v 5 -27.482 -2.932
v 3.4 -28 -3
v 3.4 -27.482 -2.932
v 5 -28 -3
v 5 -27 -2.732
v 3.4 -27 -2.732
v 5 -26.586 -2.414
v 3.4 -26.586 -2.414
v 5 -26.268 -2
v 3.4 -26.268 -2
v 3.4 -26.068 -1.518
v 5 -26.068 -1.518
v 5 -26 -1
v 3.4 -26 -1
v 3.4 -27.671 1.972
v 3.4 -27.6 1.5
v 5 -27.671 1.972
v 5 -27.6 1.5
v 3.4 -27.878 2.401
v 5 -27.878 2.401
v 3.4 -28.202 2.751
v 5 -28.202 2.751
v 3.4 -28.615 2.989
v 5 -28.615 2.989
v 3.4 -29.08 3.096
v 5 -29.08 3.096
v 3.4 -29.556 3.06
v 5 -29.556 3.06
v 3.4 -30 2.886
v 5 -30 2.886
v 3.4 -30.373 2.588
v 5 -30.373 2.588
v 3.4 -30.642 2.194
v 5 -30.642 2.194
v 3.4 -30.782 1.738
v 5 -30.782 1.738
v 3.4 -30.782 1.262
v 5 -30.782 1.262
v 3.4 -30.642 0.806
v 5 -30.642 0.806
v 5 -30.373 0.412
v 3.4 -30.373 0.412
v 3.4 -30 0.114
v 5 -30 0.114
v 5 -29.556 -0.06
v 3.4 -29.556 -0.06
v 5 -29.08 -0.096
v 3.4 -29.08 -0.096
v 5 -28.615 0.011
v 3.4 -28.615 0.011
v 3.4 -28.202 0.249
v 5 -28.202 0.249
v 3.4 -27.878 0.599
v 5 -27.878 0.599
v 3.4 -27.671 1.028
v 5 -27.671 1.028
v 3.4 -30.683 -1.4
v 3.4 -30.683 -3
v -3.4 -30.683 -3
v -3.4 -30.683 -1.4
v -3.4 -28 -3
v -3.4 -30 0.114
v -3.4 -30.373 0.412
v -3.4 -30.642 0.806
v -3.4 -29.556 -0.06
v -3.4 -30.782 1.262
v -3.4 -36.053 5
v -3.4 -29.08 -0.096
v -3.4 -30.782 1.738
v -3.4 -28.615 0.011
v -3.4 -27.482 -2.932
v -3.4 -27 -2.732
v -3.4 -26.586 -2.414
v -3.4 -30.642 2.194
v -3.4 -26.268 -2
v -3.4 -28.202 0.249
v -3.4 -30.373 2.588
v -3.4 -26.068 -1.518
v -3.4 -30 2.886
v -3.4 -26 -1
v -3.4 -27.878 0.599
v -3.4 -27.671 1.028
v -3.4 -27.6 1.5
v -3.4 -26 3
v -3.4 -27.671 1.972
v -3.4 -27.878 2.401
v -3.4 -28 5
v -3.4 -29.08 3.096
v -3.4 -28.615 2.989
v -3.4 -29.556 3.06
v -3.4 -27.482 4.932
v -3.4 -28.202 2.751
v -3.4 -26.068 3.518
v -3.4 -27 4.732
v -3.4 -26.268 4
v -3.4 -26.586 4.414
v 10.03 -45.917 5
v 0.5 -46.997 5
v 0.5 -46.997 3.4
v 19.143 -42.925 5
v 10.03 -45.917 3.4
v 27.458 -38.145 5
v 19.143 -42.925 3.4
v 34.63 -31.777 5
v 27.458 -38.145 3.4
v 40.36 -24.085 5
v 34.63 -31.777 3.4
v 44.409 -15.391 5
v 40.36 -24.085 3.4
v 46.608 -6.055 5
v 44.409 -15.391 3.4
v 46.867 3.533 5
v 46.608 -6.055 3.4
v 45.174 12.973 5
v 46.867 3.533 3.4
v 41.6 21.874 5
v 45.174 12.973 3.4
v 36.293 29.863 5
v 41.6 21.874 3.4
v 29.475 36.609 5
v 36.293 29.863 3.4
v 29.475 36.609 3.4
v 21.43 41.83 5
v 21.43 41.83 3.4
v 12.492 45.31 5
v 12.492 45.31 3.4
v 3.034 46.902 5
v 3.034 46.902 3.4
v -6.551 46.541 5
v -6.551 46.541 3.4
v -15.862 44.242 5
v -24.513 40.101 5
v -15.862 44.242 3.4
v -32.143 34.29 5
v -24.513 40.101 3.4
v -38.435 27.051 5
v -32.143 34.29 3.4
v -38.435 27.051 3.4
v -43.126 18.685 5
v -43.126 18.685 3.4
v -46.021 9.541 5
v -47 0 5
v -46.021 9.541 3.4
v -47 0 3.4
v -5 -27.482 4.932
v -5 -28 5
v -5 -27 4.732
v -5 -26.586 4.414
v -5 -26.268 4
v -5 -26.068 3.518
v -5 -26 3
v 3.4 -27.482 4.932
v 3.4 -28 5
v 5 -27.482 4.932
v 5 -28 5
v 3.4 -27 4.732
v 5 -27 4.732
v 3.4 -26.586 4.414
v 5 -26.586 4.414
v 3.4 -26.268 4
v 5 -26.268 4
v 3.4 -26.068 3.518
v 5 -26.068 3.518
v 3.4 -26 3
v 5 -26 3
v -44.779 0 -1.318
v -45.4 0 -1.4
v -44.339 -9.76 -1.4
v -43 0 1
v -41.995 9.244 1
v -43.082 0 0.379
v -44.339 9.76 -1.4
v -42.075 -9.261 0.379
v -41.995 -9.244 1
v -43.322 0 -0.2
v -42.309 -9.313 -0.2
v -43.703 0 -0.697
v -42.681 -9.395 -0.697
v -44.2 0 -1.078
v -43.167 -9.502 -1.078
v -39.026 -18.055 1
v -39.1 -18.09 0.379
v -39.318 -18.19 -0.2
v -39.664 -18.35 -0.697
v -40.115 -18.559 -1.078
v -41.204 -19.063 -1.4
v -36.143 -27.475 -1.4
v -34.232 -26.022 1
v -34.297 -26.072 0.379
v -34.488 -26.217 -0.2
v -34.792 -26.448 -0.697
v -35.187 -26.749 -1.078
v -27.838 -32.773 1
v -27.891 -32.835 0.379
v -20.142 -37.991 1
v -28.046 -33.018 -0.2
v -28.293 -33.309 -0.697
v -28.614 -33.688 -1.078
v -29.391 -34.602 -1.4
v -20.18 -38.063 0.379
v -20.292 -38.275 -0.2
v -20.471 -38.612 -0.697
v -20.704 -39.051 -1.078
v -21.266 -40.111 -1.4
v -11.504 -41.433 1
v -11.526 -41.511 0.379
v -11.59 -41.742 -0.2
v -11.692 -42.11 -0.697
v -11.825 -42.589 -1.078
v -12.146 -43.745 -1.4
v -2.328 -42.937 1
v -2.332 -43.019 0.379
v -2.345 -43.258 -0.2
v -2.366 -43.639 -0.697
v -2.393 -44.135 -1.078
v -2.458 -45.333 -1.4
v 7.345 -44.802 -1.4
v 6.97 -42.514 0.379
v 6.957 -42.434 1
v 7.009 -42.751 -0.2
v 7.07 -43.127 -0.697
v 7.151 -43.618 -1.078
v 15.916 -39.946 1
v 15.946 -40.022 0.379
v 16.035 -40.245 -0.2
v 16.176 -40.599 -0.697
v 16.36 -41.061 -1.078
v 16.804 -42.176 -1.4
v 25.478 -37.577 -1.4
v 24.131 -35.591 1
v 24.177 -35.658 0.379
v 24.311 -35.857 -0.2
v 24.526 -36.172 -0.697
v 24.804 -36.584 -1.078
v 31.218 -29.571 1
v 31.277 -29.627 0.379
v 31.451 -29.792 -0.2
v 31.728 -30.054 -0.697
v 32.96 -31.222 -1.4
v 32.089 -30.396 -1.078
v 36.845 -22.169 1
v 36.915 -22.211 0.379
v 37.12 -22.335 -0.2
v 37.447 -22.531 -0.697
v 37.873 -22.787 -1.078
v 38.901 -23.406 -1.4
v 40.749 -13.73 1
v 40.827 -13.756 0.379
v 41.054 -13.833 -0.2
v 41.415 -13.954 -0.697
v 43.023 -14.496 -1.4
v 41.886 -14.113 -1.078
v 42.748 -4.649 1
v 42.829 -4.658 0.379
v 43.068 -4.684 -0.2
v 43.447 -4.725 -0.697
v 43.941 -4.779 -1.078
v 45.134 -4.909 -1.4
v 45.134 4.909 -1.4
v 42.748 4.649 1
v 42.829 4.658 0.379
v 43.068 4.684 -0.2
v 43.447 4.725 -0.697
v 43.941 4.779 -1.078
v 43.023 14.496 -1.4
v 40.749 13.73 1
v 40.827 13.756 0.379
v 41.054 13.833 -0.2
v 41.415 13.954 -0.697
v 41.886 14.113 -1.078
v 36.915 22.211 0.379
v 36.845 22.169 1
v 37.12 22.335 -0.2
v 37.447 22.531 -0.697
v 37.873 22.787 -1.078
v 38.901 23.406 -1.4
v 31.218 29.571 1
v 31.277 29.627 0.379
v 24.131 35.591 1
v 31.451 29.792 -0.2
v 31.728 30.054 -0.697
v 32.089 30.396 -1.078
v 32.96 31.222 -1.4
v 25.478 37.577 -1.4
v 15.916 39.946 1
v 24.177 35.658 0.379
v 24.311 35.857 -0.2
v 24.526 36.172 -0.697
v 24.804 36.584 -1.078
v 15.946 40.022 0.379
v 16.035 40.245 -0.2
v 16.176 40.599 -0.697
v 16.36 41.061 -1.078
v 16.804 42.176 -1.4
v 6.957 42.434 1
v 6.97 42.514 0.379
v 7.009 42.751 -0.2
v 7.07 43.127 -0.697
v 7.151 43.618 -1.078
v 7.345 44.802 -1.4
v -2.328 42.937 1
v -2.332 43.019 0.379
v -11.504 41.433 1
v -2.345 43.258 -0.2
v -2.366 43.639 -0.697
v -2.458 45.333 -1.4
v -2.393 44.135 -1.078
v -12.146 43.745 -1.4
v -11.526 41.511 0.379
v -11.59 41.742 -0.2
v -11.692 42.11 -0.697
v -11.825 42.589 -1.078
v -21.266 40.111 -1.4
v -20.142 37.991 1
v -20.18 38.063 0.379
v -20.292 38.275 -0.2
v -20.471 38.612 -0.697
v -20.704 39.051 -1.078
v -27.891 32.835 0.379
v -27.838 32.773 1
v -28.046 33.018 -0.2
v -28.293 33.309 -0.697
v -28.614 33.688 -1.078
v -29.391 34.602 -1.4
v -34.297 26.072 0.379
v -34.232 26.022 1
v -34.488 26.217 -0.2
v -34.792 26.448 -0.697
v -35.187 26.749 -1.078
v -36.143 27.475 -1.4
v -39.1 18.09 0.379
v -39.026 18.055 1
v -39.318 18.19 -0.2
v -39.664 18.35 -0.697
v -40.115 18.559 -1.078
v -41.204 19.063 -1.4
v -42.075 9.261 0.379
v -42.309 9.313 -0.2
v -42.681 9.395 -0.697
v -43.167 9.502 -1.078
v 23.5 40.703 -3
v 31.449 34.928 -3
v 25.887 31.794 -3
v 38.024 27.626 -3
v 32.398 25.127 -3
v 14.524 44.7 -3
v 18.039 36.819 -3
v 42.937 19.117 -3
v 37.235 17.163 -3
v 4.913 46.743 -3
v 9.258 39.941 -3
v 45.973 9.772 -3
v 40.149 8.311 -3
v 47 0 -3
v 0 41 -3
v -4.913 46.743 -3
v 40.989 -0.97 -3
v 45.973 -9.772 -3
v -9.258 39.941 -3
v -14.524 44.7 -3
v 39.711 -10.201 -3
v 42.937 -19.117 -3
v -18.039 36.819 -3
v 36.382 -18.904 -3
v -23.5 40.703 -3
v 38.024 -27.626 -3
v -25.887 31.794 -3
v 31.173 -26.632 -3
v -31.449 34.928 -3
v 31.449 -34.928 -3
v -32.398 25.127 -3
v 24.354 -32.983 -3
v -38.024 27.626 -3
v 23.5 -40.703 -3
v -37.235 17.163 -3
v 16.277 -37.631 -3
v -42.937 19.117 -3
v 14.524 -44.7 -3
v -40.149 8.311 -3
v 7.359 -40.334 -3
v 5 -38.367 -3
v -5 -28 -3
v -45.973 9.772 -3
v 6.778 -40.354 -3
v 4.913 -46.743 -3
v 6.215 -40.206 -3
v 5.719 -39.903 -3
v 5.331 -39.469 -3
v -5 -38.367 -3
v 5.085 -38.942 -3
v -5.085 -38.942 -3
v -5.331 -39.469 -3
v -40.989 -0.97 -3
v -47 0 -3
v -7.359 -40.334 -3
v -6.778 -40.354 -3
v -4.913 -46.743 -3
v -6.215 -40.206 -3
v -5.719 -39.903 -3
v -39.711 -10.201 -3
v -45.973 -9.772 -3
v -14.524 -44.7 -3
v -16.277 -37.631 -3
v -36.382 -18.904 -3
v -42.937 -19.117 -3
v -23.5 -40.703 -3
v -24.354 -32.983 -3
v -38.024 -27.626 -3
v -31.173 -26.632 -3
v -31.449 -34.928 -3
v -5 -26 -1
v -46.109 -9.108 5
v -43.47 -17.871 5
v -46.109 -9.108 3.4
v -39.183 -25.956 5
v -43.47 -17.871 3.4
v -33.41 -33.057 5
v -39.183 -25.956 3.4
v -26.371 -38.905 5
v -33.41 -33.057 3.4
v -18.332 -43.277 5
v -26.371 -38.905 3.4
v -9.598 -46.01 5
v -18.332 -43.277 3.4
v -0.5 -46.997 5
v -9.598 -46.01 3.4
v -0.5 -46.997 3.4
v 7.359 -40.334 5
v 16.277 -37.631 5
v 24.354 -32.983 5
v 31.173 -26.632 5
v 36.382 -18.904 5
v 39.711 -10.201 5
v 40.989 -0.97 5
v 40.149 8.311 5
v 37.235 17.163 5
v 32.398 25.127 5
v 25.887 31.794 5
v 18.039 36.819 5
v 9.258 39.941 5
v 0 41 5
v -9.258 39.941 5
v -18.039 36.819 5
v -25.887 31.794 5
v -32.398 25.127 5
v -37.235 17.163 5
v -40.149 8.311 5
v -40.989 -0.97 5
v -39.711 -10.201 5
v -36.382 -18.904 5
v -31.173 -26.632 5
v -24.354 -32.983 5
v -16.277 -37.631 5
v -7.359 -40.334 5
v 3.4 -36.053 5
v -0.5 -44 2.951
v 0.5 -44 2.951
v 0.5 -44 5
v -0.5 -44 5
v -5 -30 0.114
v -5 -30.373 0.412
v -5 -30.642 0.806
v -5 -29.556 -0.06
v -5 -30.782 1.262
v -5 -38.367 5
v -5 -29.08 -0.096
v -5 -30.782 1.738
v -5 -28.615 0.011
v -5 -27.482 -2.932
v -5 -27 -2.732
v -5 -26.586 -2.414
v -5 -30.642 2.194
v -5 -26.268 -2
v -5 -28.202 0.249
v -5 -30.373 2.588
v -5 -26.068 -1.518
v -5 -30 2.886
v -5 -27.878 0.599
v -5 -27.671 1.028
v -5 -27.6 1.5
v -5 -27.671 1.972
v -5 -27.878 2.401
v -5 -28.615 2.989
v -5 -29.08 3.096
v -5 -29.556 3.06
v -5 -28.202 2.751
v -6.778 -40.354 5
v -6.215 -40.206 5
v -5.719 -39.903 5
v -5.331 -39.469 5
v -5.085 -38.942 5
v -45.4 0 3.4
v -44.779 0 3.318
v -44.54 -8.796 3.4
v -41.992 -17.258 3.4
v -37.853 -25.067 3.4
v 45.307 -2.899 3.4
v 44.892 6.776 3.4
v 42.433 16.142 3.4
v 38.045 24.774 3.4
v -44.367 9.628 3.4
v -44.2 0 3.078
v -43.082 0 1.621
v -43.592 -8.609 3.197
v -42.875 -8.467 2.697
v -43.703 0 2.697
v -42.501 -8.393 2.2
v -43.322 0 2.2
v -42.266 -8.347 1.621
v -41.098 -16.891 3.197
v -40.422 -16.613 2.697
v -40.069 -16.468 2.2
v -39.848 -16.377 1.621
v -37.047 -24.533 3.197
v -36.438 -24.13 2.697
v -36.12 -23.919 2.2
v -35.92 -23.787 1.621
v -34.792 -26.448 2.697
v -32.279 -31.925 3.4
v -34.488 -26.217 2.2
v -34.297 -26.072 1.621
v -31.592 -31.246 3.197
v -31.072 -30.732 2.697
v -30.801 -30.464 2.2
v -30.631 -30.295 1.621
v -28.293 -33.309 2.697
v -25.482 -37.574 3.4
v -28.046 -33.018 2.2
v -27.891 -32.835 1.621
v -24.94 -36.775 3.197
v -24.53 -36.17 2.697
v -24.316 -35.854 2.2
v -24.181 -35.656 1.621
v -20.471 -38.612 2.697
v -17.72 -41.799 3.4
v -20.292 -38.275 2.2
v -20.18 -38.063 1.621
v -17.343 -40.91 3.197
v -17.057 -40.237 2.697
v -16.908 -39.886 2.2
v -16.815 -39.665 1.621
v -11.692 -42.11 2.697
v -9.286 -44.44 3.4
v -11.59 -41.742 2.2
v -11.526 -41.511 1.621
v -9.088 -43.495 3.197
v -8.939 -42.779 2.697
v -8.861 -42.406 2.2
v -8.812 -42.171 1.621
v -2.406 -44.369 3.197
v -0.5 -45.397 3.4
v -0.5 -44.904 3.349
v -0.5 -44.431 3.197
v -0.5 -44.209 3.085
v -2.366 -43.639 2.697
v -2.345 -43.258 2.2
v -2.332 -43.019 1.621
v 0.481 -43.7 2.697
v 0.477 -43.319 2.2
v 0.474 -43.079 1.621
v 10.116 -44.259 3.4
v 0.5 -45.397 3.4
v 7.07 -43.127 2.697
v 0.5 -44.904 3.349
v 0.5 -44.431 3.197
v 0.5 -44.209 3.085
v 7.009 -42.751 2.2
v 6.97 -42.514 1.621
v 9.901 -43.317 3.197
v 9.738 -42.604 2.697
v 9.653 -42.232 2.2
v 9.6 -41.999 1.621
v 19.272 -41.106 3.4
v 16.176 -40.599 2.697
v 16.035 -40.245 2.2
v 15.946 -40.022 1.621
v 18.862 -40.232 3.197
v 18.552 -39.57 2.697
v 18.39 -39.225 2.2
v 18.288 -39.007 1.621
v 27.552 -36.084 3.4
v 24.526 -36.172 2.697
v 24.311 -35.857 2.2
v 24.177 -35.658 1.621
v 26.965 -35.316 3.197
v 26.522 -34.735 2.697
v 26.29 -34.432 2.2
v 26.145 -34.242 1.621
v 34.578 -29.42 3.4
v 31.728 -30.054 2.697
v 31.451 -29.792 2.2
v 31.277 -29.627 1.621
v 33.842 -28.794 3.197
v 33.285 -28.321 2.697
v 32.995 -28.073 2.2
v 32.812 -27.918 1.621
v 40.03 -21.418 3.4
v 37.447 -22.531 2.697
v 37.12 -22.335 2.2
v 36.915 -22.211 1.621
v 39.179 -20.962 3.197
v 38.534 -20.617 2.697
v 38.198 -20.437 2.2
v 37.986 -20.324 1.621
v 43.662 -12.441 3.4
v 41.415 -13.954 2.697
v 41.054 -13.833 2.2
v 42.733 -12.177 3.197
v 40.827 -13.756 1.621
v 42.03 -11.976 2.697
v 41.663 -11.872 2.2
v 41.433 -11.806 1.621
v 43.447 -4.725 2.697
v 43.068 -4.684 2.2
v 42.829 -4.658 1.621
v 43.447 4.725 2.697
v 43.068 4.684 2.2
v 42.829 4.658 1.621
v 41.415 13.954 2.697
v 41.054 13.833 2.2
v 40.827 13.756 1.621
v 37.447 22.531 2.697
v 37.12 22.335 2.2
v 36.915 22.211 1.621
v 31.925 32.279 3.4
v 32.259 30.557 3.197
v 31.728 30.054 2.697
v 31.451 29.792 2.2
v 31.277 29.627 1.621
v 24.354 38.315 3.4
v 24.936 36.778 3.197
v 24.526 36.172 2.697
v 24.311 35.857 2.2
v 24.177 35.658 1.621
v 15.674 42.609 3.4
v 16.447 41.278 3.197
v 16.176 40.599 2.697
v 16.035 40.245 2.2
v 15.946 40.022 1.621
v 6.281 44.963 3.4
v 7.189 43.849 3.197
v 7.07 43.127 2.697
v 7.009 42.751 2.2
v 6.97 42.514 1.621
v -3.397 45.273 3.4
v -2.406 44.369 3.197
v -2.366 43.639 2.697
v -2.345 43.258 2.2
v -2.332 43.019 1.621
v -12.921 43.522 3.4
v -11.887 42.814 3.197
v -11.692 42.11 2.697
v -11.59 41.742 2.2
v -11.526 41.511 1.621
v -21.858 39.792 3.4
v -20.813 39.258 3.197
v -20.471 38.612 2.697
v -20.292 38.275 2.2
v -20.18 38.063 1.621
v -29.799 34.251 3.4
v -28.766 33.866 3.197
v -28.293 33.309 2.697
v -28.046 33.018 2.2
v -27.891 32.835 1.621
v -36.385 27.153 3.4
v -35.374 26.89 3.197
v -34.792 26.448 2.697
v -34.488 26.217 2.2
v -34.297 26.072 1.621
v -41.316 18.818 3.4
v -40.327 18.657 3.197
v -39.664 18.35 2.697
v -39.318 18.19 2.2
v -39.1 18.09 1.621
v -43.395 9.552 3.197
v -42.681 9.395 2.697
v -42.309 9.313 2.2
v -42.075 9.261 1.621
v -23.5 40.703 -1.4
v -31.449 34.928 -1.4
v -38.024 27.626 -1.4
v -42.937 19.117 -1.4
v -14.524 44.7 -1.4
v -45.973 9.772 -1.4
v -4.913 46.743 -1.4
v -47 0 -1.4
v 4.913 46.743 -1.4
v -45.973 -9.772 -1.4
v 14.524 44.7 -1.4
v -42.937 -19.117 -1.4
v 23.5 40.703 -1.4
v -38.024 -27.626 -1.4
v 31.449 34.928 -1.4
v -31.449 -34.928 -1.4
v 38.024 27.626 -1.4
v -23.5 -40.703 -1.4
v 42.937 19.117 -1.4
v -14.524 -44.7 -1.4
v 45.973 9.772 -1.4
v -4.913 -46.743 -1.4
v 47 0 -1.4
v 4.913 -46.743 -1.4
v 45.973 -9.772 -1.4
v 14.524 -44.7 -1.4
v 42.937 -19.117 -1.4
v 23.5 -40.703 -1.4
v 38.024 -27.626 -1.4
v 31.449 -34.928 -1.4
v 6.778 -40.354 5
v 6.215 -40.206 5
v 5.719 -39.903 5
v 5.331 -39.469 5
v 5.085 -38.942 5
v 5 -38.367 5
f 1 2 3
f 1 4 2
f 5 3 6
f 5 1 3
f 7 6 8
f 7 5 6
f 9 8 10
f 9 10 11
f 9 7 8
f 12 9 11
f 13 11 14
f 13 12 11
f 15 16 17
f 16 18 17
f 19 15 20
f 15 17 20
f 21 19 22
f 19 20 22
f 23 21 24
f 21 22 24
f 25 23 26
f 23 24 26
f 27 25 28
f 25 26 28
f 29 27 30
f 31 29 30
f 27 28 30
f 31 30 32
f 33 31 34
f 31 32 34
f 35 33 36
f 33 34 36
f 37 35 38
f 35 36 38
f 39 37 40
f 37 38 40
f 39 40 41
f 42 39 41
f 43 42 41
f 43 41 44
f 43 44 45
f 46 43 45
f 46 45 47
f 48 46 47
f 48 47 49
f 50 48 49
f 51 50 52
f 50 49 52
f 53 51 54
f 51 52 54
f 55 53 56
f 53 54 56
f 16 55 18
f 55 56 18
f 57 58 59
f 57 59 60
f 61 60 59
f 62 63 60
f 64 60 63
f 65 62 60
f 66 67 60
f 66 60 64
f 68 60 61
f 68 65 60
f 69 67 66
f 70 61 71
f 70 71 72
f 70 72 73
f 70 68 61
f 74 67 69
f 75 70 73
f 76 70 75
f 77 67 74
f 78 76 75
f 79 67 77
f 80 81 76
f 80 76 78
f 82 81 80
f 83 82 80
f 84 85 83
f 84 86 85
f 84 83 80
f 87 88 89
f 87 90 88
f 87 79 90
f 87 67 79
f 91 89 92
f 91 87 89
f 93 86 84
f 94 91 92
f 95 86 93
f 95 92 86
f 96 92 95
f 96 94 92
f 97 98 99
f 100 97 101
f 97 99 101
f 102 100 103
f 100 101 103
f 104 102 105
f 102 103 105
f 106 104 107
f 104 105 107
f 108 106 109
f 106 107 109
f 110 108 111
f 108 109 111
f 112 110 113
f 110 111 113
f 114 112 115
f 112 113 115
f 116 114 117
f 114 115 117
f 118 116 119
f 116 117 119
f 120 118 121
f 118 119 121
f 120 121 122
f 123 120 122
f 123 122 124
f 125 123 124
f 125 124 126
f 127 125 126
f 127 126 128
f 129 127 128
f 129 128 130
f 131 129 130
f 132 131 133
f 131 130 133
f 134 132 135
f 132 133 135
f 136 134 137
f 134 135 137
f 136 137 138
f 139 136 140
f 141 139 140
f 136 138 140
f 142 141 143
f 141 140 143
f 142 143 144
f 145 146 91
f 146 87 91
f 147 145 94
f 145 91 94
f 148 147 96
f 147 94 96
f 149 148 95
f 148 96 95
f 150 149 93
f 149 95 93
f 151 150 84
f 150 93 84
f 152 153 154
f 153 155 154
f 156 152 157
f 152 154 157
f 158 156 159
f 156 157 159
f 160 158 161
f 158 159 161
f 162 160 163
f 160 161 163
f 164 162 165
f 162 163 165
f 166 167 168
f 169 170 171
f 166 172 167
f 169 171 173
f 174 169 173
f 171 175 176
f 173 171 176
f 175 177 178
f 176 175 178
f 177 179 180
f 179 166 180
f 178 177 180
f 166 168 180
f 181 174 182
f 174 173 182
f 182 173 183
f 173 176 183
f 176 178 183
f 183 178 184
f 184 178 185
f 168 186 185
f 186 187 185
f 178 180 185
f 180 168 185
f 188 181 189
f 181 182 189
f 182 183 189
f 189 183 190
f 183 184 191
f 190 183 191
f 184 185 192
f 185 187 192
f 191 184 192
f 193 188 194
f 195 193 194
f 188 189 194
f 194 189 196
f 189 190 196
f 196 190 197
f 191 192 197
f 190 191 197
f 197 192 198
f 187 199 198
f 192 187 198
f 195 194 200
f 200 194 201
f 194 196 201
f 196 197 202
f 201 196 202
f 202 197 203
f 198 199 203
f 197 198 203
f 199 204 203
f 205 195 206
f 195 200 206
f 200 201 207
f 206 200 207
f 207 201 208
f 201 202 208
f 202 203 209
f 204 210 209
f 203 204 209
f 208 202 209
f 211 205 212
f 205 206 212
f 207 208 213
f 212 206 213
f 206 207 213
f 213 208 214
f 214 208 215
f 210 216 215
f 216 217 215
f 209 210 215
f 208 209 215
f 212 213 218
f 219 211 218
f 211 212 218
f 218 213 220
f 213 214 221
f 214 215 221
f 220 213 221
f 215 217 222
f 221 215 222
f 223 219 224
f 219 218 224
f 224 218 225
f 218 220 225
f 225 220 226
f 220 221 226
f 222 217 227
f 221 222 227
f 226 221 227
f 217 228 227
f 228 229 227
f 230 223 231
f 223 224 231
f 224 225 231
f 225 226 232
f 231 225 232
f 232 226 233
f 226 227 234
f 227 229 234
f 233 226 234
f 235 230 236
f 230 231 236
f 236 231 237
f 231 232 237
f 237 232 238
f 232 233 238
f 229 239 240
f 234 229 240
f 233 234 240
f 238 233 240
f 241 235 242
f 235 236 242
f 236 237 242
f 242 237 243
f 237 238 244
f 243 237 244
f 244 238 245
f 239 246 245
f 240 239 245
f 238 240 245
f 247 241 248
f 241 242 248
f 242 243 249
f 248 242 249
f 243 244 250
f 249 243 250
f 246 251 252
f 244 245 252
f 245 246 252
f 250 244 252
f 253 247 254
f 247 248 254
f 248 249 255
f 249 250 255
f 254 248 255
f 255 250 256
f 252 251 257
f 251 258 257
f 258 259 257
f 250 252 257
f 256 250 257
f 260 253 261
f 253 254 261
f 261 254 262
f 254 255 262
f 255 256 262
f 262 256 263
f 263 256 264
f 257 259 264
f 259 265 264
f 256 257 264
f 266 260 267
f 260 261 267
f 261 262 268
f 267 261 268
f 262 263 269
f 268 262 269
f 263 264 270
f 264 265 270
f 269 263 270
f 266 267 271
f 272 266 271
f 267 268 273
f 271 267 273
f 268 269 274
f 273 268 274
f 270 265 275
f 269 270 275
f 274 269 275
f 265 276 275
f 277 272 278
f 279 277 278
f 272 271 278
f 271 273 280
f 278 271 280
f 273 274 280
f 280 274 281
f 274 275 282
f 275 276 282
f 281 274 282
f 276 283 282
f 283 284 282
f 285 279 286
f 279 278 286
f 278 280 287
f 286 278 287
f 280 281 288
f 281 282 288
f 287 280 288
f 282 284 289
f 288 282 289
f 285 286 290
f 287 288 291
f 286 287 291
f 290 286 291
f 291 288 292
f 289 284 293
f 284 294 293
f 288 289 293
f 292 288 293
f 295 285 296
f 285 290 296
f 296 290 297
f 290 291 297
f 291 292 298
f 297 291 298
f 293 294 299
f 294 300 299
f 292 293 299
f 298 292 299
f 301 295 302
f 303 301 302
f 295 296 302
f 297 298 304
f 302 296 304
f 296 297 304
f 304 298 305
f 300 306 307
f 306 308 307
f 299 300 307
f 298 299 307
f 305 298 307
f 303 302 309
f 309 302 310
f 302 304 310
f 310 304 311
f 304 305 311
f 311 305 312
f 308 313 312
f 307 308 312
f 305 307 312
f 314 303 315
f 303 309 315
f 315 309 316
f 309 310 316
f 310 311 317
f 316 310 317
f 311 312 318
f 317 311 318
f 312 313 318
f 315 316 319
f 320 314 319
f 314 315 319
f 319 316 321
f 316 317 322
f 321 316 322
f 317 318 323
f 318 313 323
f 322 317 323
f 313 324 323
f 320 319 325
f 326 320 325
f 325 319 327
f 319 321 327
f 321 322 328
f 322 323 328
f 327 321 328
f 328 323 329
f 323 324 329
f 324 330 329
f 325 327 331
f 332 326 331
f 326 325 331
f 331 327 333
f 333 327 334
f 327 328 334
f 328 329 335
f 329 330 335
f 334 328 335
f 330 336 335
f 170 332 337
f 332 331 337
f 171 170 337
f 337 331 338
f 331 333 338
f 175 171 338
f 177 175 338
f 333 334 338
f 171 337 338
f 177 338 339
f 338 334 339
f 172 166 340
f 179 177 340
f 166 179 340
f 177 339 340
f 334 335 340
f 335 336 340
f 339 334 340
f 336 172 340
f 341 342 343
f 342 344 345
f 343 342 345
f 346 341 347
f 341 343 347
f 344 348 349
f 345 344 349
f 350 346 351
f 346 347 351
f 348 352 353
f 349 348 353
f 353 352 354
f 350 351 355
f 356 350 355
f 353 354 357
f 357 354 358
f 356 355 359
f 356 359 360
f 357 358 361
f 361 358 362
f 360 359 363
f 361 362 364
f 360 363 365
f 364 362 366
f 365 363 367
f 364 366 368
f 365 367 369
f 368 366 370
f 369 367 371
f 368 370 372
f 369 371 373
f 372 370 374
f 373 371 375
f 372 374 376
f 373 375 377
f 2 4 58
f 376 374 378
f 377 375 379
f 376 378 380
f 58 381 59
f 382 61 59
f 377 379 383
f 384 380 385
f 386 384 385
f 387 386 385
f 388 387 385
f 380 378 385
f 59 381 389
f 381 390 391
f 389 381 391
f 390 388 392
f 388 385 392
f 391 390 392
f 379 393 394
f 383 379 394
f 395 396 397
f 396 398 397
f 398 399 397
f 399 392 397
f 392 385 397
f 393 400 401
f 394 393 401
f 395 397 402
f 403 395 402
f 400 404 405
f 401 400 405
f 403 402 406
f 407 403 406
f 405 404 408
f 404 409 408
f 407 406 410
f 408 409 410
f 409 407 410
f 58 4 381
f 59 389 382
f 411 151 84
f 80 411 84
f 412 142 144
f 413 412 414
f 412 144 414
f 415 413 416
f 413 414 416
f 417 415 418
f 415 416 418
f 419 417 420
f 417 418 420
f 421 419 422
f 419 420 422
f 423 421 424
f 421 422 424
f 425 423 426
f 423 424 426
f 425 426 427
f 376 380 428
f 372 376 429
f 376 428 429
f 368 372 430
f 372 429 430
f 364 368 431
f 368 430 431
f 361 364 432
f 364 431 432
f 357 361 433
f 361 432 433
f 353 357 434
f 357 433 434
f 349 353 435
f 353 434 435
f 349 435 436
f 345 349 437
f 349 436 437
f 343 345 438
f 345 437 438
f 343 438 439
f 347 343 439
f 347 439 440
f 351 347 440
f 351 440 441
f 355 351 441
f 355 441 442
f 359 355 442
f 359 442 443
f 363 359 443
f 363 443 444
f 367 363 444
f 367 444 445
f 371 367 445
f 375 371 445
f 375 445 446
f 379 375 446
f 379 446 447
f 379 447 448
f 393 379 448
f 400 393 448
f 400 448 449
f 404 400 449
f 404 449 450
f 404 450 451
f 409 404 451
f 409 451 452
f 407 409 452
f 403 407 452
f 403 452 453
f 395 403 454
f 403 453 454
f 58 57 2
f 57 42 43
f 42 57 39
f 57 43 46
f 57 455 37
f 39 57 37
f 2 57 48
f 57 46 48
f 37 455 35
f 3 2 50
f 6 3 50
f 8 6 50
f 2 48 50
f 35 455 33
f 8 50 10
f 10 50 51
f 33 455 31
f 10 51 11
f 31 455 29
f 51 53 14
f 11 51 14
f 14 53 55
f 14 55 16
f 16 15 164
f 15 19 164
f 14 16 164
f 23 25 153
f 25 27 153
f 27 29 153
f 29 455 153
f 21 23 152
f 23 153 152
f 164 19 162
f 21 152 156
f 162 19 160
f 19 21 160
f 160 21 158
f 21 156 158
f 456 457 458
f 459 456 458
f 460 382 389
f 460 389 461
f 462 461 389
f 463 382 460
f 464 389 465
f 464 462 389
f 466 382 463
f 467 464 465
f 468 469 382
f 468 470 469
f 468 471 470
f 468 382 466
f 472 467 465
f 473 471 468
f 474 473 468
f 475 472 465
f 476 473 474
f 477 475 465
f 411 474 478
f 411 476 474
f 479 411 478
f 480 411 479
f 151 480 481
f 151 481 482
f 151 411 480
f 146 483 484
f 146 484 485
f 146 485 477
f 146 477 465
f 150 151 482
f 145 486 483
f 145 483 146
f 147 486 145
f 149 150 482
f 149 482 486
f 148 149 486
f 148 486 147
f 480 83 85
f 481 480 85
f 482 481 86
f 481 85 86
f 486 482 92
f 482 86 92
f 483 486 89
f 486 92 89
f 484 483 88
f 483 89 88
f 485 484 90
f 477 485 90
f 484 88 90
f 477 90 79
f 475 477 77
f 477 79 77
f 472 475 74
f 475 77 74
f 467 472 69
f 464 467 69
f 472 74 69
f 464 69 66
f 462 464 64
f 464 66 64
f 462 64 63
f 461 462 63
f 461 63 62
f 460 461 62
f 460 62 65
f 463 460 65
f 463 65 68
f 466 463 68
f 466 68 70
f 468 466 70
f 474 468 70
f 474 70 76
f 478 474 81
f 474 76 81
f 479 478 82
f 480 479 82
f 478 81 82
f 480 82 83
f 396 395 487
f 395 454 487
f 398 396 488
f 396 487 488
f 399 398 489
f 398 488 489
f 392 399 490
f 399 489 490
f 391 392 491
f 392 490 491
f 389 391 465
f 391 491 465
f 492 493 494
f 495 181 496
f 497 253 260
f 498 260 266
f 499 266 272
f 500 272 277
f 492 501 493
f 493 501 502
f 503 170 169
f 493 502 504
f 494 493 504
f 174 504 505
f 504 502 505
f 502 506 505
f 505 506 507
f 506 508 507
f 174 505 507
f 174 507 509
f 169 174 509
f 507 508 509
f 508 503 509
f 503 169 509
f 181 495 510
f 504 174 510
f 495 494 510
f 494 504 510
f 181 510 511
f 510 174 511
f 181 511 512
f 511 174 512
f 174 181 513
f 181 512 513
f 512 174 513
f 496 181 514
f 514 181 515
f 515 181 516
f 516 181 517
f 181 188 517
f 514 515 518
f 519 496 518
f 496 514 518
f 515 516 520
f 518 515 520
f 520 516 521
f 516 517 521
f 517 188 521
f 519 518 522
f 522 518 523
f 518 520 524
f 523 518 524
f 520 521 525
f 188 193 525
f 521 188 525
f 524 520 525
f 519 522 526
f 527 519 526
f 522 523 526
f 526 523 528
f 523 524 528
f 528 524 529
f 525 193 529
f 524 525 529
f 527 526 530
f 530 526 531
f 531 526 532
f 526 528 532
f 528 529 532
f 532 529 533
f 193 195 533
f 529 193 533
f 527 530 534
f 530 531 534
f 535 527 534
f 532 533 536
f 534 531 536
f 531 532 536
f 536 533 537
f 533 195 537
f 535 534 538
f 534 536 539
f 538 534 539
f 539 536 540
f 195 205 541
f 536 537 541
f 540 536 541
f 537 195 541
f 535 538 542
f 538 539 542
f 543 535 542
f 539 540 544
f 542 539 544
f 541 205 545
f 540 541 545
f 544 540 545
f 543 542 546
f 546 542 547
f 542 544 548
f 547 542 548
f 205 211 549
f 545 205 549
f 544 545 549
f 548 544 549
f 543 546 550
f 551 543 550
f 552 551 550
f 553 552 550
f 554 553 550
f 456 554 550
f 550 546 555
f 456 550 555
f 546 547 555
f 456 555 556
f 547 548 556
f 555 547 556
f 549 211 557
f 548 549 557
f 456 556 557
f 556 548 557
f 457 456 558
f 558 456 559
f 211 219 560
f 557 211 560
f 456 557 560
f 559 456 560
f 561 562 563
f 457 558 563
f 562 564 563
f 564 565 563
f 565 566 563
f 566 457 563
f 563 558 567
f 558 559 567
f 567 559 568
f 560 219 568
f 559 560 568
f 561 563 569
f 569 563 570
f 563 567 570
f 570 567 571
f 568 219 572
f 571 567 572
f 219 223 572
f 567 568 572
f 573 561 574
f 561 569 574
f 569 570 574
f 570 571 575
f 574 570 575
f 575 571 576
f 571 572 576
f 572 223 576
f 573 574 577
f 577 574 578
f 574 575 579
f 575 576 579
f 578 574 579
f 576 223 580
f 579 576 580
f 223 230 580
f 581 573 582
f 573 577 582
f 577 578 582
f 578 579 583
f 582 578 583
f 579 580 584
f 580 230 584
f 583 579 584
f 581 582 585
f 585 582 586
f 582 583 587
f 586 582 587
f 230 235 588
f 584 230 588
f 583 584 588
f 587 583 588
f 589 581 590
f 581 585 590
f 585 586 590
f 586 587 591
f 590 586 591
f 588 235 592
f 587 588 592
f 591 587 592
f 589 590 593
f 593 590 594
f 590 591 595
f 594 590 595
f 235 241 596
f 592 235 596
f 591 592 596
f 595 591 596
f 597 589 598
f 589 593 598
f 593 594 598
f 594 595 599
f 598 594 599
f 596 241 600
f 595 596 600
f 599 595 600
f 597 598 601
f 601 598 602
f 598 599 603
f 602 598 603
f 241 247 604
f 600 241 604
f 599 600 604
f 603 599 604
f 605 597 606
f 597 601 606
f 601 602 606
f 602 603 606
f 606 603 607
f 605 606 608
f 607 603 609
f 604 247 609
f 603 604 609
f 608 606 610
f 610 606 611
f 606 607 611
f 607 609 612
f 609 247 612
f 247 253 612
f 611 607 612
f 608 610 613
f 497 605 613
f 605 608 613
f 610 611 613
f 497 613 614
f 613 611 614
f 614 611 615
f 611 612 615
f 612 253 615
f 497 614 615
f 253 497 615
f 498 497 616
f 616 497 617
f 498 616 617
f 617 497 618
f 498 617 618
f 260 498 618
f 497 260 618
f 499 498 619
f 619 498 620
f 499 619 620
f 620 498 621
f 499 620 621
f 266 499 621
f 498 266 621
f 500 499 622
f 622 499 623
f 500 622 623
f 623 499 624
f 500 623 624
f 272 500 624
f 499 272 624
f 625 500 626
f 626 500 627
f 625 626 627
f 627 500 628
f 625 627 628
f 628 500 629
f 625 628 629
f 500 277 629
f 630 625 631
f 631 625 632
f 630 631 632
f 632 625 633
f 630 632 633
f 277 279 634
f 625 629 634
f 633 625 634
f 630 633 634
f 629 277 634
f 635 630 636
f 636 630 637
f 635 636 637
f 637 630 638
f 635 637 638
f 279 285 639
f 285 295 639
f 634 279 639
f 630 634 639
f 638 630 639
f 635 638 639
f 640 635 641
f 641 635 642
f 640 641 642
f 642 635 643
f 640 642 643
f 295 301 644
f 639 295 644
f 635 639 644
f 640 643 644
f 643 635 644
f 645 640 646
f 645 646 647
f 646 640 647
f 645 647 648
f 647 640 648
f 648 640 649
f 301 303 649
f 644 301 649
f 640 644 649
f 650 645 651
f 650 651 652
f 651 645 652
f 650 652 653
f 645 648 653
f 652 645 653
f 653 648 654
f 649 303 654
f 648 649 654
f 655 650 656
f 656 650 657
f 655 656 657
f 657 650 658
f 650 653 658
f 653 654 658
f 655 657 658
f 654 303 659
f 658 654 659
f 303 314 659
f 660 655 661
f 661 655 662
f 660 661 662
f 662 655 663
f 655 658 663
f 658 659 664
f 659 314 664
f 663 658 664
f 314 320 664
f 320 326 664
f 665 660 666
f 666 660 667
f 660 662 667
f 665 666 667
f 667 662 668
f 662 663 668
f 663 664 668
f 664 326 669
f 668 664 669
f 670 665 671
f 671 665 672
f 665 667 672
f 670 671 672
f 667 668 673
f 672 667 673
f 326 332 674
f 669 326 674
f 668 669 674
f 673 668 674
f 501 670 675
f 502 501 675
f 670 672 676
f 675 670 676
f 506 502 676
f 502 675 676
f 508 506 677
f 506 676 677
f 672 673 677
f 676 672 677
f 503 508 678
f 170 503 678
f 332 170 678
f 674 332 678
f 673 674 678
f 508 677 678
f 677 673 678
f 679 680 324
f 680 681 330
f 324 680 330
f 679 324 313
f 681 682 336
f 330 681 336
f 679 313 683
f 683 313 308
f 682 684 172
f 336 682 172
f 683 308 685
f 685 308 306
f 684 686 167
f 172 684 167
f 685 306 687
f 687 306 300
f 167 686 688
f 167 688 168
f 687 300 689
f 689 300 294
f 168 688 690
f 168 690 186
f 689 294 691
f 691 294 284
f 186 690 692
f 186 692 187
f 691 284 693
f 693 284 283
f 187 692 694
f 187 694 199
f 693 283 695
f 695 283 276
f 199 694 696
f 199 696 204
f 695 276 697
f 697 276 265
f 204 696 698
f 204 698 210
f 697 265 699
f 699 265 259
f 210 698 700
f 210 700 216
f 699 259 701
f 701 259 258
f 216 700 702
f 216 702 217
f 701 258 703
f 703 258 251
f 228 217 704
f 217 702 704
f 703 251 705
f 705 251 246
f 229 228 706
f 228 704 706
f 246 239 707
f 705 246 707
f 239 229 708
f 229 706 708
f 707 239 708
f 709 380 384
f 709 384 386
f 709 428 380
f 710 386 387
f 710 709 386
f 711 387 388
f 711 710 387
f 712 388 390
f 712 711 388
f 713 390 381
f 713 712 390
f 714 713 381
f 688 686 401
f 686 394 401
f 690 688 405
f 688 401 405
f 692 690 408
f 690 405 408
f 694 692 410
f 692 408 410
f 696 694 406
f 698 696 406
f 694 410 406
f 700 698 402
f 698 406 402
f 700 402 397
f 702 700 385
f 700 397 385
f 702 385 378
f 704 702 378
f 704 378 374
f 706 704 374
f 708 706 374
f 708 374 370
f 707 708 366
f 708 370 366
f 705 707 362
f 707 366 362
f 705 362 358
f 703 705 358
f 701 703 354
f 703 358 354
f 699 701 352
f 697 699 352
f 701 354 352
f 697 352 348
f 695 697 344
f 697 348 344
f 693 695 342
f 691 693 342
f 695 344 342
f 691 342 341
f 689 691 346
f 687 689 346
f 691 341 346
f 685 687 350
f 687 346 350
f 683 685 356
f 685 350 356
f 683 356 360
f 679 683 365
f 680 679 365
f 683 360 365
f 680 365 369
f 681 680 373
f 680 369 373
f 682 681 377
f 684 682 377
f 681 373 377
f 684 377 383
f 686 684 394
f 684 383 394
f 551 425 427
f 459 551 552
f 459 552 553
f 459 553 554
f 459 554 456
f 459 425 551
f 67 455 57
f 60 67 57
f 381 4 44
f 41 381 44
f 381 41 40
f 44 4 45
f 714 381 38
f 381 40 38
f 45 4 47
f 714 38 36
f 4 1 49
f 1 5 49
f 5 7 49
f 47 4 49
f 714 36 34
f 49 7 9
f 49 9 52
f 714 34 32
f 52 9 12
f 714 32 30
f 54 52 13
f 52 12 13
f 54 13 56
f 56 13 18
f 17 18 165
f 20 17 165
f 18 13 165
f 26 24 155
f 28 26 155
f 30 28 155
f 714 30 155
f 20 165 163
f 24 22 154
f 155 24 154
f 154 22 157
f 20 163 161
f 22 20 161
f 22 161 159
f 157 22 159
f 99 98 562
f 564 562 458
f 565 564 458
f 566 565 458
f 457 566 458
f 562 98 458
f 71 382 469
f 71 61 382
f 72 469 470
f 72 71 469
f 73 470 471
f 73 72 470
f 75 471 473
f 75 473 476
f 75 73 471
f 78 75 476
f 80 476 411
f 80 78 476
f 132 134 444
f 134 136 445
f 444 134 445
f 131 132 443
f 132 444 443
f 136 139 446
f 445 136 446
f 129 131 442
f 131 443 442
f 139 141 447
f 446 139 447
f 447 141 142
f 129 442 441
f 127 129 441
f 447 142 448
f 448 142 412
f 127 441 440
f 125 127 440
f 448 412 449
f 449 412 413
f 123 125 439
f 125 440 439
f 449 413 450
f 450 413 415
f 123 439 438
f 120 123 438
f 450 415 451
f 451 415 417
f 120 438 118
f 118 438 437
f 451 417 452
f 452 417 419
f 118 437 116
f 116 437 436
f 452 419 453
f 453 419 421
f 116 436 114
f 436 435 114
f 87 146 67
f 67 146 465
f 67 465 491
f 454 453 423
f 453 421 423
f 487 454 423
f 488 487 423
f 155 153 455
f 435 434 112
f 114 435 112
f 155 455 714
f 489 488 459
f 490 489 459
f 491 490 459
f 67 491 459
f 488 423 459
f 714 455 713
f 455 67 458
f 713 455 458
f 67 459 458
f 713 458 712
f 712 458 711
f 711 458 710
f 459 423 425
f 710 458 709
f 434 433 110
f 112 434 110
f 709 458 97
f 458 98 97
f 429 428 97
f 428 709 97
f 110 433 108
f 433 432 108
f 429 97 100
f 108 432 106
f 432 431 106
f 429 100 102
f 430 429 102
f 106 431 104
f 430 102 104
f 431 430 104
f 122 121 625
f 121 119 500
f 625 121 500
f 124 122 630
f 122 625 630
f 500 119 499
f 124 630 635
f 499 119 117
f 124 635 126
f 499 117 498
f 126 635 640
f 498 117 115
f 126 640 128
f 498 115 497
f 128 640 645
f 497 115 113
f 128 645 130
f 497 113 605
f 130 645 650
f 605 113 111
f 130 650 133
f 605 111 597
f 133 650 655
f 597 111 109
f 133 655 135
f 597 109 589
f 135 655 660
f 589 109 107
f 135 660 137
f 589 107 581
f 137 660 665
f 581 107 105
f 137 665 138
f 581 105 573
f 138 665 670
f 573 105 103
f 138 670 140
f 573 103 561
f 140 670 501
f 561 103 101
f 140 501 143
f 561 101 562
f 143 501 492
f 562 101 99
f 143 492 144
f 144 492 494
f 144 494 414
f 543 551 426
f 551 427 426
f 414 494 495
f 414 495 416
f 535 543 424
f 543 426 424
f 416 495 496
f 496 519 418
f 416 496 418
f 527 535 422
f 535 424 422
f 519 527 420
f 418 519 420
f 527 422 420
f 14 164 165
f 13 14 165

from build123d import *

# Parameters (mm, degrees)
F2_R      = 2.4
F3_R      = 2.39999
F5_W      = 10
F5_H      = 8
F7_R      = 1.6
F8_DEPTH  = 5
F7_W      = 4.6828329376
F7_H      = 1.903038422
F9_DEPTH  = 3.4
F10_R     = 2
F11_W     = 4
F11_H     = 4
F12_DEPTH = 0.5


# Not quite as in the source:
# - a fillet or chamfer is up to 0.001 mm smaller than in the source, because OpenCascade refuses the exact size
# - a feature names something its author has since deleted; it is built from what else it names


with BuildPart() as f1:
    # F0 (on Front) → F1 (revolve)
    with BuildSketch(Plane.XZ):
        Polygon((-41, 5), (-47, 5), (-47, 3.4), (-43, 3.4), (-43, -1.4), (-47, -1.4), (-47, -3), (-41, -3), align=None)
    revolve(axis=Axis((0, 0, 0.7178727537), (0, 0, 1)))

    # F2
    f2_edges = [f1.edges().sort_by_distance(p)[0] for p in [
        (43, 0, 3.4),
    ]]
    fillet(f2_edges, radius=F2_R)

    # F3 (radius 2.4 in the source; OpenCascade refuses exactly that, so slightly less here)
    f3_edges = [f1.edges().sort_by_distance(p)[0] for p in [
        (43, 0, -1.4),
    ]]
    fillet(f3_edges, radius=F3_R)

    # F5 (on offset) → F6 (join, up to the next surface of F1)
    with BuildSketch(Plane.XZ.offset(26)):
        with Locations((0, 1)):
            Rectangle(F5_W, F5_H)
    extrude(until=Until.NEXT)

    # F7 (on Right) → F8 (cut, symmetric)
    with BuildSketch(Plane.YZ):
        with Locations((-29.2, 1.5)):
            Circle(F7_R)
    extrude(amount=F8_DEPTH, both=True, mode=Mode.SUBTRACT)

    # F7 (on Right) → F9 (cut, symmetric)
    with BuildSketch(Plane.YZ):
        Polygon((-26, 5.4147794951), (-36.4011118985, 5.4147794951), (-30.6828329376, -1.4), (-26, -1.4), (-26, 3.0355471618), align=None)
        with Locations((-29.2, 1.5)):
            Circle(F7_R, mode=Mode.SUBTRACT)
        with Locations((-28.3414164688, -2.351519211)):
            Rectangle(F7_W, F7_H)
    extrude(amount=F9_DEPTH, both=True, mode=Mode.SUBTRACT)

    # F10
    f10_edges = [f1.edges().sort_by_distance(p)[0] for p in [
        (-4.2, -26, 5),
        (4.2, -26, 5),
        (-4.2, -26, -3),
        (4.2, -26, -3),
        (-5, -40.69398, 1),
        (5, -40.69398, 1),
    ]]
    fillet(f10_edges, radius=F10_R)

    # F11 (on Right) → F12 (cut, symmetric)
    with BuildSketch(Plane.YZ):
        with Locations((-46, 3)):
            Rectangle(F11_W, F11_H)
    extrude(amount=F12_DEPTH, both=True, mode=Mode.SUBTRACT)


solid = f1.part
